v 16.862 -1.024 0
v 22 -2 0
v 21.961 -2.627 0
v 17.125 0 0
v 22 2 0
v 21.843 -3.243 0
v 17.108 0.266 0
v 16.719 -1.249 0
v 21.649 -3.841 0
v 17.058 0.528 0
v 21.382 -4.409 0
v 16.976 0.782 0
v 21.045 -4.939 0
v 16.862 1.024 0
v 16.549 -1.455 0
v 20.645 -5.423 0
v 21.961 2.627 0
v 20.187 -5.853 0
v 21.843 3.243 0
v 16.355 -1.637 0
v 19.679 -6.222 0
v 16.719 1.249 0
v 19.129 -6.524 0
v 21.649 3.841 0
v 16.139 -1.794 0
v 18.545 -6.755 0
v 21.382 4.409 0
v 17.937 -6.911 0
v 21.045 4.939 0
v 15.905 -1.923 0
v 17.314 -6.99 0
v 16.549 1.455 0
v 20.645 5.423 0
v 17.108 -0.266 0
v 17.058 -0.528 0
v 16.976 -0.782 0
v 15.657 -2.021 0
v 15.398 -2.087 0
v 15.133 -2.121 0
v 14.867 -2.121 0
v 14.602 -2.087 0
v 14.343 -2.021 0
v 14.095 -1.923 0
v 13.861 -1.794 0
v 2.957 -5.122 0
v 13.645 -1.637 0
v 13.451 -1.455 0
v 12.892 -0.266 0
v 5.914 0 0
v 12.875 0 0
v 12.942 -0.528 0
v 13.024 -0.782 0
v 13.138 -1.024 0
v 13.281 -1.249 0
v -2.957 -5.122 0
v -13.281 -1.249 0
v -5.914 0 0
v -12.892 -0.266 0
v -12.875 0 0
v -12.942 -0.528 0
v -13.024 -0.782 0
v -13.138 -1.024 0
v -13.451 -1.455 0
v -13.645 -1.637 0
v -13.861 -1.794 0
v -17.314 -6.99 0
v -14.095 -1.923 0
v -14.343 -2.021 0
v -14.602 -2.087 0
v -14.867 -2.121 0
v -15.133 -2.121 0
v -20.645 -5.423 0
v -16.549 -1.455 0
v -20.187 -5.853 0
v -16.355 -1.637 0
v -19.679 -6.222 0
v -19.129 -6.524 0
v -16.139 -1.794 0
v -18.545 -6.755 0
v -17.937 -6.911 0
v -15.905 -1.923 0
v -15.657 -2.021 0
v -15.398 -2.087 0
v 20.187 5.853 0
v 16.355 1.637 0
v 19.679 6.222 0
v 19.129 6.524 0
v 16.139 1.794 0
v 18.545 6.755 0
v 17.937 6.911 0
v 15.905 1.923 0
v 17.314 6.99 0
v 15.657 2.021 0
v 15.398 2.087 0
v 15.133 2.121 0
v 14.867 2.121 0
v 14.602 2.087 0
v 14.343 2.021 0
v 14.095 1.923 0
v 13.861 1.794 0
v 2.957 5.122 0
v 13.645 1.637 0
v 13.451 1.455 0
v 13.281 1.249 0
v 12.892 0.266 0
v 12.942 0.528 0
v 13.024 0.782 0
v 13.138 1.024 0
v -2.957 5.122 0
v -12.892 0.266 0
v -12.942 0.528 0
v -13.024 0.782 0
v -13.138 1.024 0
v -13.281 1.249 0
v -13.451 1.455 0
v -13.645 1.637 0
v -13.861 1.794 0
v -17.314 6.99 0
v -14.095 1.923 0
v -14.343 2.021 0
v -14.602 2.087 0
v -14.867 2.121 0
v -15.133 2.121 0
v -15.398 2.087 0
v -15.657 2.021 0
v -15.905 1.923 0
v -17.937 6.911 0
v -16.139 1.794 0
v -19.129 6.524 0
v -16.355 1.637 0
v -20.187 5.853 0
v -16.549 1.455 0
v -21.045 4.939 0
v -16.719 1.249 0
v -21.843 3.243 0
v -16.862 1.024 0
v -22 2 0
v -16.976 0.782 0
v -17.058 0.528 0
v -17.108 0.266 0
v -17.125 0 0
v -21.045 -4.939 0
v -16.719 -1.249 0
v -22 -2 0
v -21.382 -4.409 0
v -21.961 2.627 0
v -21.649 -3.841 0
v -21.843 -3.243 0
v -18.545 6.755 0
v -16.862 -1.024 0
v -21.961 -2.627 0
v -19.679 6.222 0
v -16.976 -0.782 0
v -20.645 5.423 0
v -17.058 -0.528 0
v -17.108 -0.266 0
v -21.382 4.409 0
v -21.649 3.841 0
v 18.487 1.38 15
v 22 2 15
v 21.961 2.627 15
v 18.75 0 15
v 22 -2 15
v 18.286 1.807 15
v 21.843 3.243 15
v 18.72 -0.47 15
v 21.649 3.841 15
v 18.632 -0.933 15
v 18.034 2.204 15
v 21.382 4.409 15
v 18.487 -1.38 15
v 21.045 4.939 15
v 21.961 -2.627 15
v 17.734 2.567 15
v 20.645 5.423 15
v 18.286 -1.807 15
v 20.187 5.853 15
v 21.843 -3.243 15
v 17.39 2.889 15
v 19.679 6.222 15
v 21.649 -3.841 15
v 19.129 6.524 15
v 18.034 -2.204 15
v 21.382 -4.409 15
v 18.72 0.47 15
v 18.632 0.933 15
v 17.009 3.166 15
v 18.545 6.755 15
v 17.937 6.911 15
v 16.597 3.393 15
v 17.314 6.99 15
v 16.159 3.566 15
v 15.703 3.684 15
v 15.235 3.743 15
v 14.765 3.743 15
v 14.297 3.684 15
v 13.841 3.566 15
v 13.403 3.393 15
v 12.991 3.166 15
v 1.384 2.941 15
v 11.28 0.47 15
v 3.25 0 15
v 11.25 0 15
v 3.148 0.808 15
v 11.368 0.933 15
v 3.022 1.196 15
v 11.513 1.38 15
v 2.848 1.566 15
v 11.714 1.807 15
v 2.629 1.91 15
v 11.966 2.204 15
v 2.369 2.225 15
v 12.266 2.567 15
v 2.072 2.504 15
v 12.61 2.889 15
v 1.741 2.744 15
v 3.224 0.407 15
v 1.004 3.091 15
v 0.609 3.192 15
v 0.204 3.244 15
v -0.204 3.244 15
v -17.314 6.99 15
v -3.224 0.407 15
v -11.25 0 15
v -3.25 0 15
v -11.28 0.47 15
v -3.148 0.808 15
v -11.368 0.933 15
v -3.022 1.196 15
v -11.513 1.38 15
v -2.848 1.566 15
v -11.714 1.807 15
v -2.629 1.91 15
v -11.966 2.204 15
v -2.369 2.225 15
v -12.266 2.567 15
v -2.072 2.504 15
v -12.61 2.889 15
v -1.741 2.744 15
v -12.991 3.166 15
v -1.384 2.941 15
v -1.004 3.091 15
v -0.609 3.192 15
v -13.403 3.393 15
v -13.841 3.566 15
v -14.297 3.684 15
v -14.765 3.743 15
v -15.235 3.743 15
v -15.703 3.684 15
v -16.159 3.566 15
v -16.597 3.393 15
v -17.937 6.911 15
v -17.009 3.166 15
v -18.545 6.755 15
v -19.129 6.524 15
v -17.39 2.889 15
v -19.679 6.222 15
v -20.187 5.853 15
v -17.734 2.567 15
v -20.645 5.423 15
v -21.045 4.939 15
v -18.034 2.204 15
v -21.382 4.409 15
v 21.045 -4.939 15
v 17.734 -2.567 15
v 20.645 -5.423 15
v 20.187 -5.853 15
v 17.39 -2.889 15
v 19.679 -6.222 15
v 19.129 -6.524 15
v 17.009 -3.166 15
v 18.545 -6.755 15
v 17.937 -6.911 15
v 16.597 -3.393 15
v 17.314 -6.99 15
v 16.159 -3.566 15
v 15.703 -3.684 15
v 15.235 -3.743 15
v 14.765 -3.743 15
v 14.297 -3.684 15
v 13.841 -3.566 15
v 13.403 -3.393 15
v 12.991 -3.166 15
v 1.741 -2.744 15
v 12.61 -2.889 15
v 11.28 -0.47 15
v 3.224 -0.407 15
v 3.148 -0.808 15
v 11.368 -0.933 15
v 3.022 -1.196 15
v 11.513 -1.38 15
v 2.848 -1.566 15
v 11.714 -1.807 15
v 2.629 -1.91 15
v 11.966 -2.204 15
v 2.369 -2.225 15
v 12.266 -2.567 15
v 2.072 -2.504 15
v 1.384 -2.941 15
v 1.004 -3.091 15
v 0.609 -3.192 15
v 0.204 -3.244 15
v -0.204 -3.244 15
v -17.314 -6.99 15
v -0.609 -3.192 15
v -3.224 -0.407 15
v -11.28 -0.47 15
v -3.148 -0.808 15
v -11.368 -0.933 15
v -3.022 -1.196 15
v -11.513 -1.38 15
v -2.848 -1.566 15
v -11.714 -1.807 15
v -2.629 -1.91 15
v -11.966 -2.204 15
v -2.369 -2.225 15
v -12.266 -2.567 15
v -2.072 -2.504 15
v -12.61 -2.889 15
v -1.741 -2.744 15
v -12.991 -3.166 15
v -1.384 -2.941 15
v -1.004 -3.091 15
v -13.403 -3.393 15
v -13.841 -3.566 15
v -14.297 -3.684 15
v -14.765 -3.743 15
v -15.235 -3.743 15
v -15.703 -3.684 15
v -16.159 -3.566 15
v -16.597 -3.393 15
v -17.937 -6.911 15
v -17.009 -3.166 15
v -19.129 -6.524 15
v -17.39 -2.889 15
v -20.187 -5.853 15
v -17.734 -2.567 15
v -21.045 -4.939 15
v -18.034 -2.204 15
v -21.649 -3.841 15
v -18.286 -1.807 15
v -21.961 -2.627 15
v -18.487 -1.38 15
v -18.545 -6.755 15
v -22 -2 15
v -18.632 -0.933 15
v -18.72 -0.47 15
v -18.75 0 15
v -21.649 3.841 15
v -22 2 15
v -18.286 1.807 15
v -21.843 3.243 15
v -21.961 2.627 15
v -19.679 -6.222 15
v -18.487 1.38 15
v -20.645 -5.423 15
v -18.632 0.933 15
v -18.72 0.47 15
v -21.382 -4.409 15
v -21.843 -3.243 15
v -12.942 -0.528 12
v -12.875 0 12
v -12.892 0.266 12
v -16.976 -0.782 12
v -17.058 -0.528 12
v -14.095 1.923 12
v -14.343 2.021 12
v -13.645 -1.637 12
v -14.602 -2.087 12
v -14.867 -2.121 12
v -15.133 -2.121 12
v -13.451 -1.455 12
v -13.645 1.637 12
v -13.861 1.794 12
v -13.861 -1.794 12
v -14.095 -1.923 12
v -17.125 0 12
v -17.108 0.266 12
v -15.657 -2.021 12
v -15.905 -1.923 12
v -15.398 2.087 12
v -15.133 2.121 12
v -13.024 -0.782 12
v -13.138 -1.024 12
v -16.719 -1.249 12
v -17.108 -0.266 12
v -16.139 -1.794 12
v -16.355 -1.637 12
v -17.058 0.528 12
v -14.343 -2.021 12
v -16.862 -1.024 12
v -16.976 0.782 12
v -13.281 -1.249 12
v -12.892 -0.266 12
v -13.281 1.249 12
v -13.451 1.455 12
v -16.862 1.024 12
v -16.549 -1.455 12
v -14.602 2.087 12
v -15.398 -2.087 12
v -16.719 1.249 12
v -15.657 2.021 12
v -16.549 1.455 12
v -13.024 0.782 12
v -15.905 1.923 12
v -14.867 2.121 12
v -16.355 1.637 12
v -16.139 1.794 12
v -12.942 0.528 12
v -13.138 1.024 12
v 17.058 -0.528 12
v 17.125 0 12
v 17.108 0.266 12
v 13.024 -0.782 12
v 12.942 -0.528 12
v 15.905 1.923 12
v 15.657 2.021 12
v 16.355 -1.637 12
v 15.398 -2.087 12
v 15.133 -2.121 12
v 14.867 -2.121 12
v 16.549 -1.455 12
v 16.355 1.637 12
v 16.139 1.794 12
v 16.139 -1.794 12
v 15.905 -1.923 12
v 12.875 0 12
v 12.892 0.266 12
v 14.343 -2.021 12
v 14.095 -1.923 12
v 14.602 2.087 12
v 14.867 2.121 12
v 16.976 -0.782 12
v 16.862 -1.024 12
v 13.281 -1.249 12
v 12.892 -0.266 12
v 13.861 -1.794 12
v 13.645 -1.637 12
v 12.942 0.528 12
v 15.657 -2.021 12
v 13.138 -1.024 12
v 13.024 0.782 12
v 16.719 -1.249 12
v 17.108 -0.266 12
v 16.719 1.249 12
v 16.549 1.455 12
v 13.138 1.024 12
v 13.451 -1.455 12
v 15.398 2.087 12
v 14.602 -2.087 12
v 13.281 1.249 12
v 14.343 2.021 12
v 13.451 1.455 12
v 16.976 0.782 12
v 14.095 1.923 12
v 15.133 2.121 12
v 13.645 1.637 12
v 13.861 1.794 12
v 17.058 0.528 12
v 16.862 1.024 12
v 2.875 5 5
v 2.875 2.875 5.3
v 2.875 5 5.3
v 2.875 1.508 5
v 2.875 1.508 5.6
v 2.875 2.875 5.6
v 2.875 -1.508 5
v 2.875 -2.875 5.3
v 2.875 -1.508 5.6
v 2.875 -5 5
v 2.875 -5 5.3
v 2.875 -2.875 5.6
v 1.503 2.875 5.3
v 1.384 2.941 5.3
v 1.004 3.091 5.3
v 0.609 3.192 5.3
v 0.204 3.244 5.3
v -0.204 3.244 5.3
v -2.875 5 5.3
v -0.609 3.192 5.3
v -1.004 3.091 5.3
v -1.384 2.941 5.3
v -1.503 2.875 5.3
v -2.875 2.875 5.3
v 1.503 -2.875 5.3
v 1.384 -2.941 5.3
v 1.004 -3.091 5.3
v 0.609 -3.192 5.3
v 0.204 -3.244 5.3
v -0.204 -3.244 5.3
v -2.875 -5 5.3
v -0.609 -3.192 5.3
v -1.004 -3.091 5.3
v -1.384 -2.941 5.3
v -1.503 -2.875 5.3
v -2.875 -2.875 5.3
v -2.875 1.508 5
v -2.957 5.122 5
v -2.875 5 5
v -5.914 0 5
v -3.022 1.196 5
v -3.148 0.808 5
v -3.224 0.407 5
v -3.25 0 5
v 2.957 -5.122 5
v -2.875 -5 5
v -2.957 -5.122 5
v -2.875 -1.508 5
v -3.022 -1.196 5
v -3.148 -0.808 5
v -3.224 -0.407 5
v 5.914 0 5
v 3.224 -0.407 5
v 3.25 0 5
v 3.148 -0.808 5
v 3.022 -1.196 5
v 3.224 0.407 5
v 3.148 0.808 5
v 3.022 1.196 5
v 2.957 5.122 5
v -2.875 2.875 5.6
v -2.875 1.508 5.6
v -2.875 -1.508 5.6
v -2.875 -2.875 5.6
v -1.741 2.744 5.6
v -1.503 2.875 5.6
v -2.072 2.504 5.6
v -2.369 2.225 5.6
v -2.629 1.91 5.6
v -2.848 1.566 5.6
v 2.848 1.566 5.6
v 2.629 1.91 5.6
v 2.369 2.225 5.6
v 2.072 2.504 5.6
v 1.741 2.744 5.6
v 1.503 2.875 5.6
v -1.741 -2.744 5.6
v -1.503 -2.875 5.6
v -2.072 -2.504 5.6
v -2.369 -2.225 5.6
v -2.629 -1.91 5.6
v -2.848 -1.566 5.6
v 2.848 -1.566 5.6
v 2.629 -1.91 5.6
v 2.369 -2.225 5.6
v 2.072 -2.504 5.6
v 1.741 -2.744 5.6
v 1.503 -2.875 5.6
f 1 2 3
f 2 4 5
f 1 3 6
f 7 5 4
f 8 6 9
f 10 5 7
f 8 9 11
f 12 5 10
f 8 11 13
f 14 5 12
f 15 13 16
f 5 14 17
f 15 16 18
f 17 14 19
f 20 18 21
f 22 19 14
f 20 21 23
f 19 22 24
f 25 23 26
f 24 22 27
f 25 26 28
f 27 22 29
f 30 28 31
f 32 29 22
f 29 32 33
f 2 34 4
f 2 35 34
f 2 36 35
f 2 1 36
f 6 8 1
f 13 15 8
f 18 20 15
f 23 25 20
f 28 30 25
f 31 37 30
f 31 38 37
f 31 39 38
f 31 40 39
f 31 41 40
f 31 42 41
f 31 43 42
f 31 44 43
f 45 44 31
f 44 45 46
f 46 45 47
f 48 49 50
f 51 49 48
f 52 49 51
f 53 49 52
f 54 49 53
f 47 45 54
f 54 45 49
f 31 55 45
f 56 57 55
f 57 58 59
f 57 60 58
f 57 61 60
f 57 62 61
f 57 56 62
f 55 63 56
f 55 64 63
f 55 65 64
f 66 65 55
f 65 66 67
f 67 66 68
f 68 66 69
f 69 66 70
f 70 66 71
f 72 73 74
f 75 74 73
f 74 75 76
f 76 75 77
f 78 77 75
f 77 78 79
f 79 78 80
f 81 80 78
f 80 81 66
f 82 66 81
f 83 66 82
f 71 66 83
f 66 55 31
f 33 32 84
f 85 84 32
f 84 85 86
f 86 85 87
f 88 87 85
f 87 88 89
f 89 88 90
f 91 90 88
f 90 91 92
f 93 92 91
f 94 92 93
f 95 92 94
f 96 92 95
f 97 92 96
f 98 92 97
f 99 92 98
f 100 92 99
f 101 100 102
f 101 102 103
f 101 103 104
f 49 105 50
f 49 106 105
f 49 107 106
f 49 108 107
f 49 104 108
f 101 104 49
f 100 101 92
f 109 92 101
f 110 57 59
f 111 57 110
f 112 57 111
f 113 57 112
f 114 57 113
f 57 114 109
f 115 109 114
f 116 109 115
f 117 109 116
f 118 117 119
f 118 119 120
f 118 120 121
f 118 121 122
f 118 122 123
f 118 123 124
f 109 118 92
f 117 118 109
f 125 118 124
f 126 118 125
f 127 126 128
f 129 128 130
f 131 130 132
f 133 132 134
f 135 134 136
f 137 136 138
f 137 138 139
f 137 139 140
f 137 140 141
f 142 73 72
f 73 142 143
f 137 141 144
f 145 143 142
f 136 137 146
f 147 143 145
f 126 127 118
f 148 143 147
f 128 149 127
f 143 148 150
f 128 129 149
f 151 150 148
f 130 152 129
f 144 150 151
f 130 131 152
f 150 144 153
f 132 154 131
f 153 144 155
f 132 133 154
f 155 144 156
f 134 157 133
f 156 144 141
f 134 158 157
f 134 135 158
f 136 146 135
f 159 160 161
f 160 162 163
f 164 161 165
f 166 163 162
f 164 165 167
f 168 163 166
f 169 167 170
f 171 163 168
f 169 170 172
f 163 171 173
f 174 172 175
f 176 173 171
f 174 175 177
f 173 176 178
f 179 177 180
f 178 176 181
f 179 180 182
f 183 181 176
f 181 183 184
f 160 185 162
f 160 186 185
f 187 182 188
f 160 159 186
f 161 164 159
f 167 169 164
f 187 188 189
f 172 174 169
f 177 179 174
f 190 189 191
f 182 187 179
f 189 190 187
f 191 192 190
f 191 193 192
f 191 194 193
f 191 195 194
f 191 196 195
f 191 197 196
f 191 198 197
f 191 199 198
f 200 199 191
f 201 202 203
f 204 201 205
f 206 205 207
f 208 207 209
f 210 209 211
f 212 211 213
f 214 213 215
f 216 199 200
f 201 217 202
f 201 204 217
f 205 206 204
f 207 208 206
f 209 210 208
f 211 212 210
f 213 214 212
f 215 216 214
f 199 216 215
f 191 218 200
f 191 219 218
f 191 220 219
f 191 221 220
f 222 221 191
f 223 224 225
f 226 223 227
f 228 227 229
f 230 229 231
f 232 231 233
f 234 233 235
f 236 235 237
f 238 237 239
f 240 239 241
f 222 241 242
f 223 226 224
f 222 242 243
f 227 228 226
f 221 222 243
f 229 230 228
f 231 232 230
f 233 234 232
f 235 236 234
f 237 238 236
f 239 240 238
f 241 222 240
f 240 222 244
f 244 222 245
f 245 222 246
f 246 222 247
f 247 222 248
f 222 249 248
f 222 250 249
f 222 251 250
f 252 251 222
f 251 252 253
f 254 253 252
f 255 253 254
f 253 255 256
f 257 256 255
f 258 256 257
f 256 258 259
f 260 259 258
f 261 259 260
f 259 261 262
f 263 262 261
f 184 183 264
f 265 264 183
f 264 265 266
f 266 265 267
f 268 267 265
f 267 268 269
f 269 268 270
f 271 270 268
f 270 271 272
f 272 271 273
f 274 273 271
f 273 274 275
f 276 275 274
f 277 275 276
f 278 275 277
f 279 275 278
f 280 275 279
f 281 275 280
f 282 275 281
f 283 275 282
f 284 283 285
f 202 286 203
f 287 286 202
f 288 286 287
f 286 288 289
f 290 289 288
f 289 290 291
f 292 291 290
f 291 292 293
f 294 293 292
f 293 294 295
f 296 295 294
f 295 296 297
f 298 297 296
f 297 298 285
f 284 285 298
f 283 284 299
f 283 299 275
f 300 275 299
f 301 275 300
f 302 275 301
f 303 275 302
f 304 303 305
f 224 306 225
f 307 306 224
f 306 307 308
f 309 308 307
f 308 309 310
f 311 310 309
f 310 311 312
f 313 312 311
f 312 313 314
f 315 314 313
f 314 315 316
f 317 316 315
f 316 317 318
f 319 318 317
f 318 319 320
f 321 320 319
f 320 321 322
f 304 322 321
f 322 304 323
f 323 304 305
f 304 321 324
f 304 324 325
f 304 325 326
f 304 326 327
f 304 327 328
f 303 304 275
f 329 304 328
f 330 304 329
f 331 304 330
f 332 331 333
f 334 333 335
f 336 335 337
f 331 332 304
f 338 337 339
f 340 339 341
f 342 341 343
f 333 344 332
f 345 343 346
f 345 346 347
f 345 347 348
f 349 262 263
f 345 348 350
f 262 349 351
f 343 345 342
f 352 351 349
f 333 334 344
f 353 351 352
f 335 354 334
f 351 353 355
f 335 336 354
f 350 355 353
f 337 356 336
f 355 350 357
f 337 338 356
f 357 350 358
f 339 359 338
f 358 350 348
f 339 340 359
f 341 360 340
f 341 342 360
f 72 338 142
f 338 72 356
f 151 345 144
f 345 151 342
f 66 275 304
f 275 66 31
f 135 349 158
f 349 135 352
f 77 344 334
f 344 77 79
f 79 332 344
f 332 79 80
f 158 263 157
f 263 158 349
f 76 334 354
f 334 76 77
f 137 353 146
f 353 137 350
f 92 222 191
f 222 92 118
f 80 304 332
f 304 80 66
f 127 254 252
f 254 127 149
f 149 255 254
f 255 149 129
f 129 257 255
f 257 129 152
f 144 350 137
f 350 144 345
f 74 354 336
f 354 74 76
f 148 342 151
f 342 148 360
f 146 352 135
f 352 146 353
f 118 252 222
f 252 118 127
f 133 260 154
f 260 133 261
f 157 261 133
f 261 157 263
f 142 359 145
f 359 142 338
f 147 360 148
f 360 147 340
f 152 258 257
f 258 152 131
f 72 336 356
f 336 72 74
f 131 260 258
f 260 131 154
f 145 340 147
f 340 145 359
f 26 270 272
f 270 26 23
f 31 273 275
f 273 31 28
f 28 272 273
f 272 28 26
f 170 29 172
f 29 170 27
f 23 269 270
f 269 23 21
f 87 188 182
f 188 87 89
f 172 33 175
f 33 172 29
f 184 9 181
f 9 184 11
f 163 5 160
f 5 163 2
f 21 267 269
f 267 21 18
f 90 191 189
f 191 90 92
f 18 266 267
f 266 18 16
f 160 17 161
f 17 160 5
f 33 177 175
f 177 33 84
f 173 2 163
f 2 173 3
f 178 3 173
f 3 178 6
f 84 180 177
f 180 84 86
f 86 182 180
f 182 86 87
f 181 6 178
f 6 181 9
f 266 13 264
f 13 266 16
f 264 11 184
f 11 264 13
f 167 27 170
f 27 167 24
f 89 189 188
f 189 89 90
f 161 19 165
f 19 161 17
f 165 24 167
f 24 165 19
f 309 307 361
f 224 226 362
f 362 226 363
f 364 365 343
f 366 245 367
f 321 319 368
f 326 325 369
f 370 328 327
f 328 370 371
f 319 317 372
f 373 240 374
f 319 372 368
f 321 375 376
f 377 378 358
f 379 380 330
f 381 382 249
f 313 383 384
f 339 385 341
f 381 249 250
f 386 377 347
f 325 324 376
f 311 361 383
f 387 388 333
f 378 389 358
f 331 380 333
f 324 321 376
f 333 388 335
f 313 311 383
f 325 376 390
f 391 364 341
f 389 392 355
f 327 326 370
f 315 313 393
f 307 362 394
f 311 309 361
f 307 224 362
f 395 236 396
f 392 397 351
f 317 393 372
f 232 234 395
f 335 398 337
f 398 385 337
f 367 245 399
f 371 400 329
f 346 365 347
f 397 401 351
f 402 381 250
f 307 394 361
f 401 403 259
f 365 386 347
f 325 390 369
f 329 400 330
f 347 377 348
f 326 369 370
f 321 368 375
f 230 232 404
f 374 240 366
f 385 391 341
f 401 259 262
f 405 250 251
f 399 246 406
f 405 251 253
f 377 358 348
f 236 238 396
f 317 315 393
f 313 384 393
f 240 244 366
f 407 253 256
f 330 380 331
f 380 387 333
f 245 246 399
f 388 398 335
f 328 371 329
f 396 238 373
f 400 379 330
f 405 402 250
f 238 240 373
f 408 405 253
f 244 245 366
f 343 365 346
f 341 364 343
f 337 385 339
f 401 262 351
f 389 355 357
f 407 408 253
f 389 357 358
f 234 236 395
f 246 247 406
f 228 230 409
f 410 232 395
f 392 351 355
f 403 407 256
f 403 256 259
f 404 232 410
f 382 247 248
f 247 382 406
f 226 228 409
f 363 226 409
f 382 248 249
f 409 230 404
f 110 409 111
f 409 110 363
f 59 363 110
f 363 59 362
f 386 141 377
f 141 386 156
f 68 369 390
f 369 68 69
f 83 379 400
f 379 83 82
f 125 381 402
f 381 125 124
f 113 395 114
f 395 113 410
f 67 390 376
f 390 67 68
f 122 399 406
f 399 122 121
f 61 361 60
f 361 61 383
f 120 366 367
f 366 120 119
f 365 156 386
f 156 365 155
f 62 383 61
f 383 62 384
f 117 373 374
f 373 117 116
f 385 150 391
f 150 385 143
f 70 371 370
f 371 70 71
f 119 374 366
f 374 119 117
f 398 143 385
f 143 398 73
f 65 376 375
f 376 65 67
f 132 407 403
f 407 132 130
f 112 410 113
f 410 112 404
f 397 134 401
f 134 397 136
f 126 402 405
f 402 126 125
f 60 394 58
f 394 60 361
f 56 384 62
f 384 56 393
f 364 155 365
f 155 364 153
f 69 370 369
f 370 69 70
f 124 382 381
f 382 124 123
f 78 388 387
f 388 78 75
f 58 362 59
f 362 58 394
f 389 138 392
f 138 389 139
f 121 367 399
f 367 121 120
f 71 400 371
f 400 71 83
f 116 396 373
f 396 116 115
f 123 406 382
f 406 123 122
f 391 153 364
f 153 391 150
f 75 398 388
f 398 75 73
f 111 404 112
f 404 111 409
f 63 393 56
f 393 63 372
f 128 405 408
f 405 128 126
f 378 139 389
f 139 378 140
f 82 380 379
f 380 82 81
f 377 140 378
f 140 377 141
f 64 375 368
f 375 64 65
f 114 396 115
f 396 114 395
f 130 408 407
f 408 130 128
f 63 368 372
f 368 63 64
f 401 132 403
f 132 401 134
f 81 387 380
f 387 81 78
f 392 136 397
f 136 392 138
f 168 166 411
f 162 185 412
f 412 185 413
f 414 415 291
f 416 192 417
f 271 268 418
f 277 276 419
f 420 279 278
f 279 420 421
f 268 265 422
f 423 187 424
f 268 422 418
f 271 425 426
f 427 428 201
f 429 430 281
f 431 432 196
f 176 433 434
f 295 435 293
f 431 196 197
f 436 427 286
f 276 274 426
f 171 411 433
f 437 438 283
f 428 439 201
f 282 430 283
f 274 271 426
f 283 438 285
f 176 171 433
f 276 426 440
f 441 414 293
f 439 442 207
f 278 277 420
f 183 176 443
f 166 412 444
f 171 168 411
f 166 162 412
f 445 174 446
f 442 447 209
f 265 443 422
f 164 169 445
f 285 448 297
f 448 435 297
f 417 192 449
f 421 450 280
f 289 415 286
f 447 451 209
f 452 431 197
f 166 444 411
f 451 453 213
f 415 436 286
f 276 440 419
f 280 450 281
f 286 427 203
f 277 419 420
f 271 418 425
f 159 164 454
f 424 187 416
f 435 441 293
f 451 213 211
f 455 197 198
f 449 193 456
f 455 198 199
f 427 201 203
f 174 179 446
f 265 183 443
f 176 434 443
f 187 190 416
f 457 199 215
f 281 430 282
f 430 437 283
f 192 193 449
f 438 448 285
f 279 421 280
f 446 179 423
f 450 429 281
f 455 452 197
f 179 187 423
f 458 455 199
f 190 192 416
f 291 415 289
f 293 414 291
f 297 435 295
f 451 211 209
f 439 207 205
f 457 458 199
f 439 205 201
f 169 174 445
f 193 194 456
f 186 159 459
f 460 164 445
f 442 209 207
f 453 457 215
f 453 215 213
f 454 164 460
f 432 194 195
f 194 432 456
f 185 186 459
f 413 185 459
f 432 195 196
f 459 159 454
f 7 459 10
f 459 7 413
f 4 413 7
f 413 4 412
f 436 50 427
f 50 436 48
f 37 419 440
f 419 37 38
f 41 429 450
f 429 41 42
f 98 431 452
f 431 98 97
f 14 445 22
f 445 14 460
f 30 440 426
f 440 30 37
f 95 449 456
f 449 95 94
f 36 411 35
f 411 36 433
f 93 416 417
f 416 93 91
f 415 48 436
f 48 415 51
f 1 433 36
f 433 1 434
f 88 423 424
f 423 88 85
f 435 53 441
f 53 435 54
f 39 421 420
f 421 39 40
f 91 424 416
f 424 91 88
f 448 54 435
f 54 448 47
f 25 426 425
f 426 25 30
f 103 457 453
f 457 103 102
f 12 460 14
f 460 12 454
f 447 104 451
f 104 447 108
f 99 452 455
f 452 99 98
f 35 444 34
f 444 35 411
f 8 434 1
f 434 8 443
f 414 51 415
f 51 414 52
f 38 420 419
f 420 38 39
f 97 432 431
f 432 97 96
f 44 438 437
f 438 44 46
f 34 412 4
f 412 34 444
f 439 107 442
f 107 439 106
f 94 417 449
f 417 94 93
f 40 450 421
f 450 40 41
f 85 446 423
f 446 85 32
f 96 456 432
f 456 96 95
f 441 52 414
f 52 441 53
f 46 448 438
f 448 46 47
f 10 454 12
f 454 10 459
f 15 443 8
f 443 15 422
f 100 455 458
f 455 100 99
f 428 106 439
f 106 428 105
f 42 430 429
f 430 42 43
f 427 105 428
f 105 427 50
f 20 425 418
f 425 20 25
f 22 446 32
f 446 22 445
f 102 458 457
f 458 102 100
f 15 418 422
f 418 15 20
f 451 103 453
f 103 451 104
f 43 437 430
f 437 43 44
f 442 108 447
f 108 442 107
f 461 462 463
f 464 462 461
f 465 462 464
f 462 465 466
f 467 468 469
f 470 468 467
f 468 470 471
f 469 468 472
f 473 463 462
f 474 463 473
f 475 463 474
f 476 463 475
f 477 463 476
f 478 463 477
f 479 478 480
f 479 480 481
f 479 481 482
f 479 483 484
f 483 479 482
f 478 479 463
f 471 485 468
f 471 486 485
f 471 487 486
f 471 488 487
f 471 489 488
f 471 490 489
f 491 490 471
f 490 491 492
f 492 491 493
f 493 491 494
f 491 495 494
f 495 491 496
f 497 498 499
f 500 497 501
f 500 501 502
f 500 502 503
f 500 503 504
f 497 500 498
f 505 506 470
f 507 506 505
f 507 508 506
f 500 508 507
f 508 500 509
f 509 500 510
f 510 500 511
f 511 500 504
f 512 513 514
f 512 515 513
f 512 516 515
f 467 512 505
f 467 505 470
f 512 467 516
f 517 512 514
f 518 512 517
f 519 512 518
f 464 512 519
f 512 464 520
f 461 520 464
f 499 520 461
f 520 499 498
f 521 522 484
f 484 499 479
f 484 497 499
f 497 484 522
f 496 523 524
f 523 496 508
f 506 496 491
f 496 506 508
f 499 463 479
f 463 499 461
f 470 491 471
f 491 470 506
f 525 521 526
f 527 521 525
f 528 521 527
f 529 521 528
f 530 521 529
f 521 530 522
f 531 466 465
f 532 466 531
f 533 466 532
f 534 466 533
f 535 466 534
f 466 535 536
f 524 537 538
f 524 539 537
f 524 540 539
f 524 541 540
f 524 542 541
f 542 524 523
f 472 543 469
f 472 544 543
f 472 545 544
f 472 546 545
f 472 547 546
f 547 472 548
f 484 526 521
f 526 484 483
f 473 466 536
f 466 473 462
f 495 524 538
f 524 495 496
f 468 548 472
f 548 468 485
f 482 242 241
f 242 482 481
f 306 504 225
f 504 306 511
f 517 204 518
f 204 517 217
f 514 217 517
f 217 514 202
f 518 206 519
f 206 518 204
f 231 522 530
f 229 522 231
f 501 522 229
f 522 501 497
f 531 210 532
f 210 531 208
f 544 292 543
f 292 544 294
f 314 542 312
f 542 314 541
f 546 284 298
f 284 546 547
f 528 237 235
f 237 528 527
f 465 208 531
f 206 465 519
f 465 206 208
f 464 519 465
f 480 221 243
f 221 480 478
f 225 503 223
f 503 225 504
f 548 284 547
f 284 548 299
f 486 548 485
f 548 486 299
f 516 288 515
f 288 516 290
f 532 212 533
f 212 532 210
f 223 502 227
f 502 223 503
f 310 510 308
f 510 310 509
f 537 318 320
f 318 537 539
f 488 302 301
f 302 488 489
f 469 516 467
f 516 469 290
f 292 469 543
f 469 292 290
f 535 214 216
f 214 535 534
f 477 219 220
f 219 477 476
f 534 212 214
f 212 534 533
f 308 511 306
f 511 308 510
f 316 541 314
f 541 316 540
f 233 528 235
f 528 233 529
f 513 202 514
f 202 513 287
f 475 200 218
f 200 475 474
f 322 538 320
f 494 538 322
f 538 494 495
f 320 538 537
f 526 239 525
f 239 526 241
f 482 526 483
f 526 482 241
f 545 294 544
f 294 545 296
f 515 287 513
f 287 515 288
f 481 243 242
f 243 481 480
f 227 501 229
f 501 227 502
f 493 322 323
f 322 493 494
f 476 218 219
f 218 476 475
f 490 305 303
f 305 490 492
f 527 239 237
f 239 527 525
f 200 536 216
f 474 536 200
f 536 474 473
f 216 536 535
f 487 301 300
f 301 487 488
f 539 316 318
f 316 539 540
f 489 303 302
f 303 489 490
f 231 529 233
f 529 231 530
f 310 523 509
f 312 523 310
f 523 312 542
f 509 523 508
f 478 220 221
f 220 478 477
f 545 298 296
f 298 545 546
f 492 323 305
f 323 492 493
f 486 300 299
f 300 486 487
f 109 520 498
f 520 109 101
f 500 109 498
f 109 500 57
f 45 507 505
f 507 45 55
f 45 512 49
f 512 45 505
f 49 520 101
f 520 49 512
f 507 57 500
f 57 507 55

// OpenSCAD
$fn = 50;


difference() {
	union() {
		cylinder(h = 15, r = 7.0000000000);
		translate(v = [-7.5000000000, 0.0000000000, 0]) {
			hull() {
				translate(v = [-9.5000000000, 2.0000000000, 0]) {
					cylinder(h = 15, r = 5);
				}
				translate(v = [9.5000000000, 2.0000000000, 0]) {
					cylinder(h = 15, r = 5);
				}
				translate(v = [-9.5000000000, -2.0000000000, 0]) {
					cylinder(h = 15, r = 5);
				}
				translate(v = [9.5000000000, -2.0000000000, 0]) {
					cylinder(h = 15, r = 5);
				}
			}
		}
		translate(v = [-7.5000000000, 0.0000000000, 0]) {
			hull() {
				translate(v = [-9.5000000000, 2.0000000000, 0]) {
					cylinder(h = 15, r = 5);
				}
				translate(v = [9.5000000000, 2.0000000000, 0]) {
					cylinder(h = 15, r = 5);
				}
				translate(v = [-9.5000000000, -2.0000000000, 0]) {
					cylinder(h = 15, r = 5);
				}
				translate(v = [9.5000000000, -2.0000000000, 0]) {
					cylinder(h = 15, r = 5);
				}
			}
		}
		translate(v = [7.5000000000, 0.0000000000, 0]) {
			hull() {
				translate(v = [-9.5000000000, 2.0000000000, 0]) {
					cylinder(h = 15, r = 5);
				}
				translate(v = [9.5000000000, 2.0000000000, 0]) {
					cylinder(h = 15, r = 5);
				}
				translate(v = [-9.5000000000, -2.0000000000, 0]) {
					cylinder(h = 15, r = 5);
				}
				translate(v = [9.5000000000, -2.0000000000, 0]) {
					cylinder(h = 15, r = 5);
				}
			}
		}
		translate(v = [7.5000000000, 0.0000000000, 0]) {
			hull() {
				translate(v = [-9.5000000000, 2.0000000000, 0]) {
					cylinder(h = 15, r = 5);
				}
				translate(v = [9.5000000000, 2.0000000000, 0]) {
					cylinder(h = 15, r = 5);
				}
				translate(v = [-9.5000000000, -2.0000000000, 0]) {
					cylinder(h = 15, r = 5);
				}
				translate(v = [9.5000000000, -2.0000000000, 0]) {
					cylinder(h = 15, r = 5);
				}
			}
		}
	}
	union() {
		translate(v = [-15.0000000000, 0.0000000000, 15]) {
			rotate(a = [0, 0, 0]) {
				difference() {
					union() {
						#translate(v = [0, 0, -15.0000000000]) {
							cylinder(h = 15, r = 2.0000000000);
						}
						#translate(v = [0, 0, -3]) {
							cylinder(h = 3, r1 = 2.1250000000, r2 = 3.7500000000);
						}
						#translate(v = [0, 0, -15.0000000000]) {
							cylinder(h = 15, r = 2.1250000000);
						}
						#translate(v = [0, 0, -15.0000000000]) {
							cylinder(h = 15, r = 2.0000000000);
						}
					}
					union();
				}
			}
		}
		translate(v = [-15.0000000000, 0.0000000000, 15]) {
			rotate(a = [0, 0, 0]) {
				difference() {
					union() {
						#translate(v = [0, 0, -15.0000000000]) {
							cylinder(h = 15, r = 2.0000000000);
						}
						#translate(v = [0, 0, -3]) {
							cylinder(h = 3, r1 = 2.1250000000, r2 = 3.7500000000);
						}
						#translate(v = [0, 0, -15.0000000000]) {
							cylinder(h = 15, r = 2.1250000000);
						}
						#translate(v = [0, 0, -15.0000000000]) {
							cylinder(h = 15, r = 2.0000000000);
						}
					}
					union();
				}
			}
		}
		translate(v = [15.0000000000, 0.0000000000, 15]) {
			rotate(a = [0, 0, 0]) {
				difference() {
					union() {
						#translate(v = [0, 0, -15.0000000000]) {
							cylinder(h = 15, r = 2.0000000000);
						}
						#translate(v = [0, 0, -3]) {
							cylinder(h = 3, r1 = 2.1250000000, r2 = 3.7500000000);
						}
						#translate(v = [0, 0, -15.0000000000]) {
							cylinder(h = 15, r = 2.1250000000);
						}
						#translate(v = [0, 0, -15.0000000000]) {
							cylinder(h = 15, r = 2.0000000000);
						}
					}
					union();
				}
			}
		}
		translate(v = [15.0000000000, 0.0000000000, 15]) {
			rotate(a = [0, 0, 0]) {
				difference() {
					union() {
						#translate(v = [0, 0, -15.0000000000]) {
							cylinder(h = 15, r = 2.0000000000);
						}
						#translate(v = [0, 0, -3]) {
							cylinder(h = 3, r1 = 2.1250000000, r2 = 3.7500000000);
						}
						#translate(v = [0, 0, -15.0000000000]) {
							cylinder(h = 15, r = 2.1250000000);
						}
						#translate(v = [0, 0, -15.0000000000]) {
							cylinder(h = 15, r = 2.0000000000);
						}
					}
					union();
				}
			}
		}
		translate(v = [0.0000000000, 0.0000000000, 0]) {
			rotate(a = [0, 0, 0]) {
				difference() {
					union() {
						#translate(v = [-2.8750000000, -5.0000000000, -0.3000000000]) {
							cube(size = [5.7500000000, 10, 0.3000000000]);
						}
						#translate(v = [-2.8750000000, -2.8750000000, -0.6000000000]) {
							cube(size = [5.7500000000, 5.7500000000, 0.3000000000]);
						}
						#translate(v = [-2.8750000000, -5.0000000000, 5]) {
							cube(size = [5.7500000000, 10, 0.3000000000]);
						}
						#translate(v = [-2.8750000000, -2.8750000000, 5.3000000000]) {
							cube(size = [5.7500000000, 5.7500000000, 0.3000000000]);
						}
						#translate(v = [0, 0, -100.0000000000]) {
							cylinder(h = 200, r = 3.2500000000);
						}
						#linear_extrude(height = 5) {
							polygon(points = [[5.9142500000, 0.0000000000], [2.9571250000, 5.1218907443], [-2.9571250000, 5.1218907443], [-5.9142500000, 0.0000000000], [-2.9571250000, -5.1218907443], [2.9571250000, -5.1218907443]]);
						}
						#translate(v = [-2.8750000000, -5.0000000000, -0.3000000000]) {
							cube(size = [5.7500000000, 10, 0.3000000000]);
						}
						#translate(v = [-2.8750000000, -2.8750000000, -0.6000000000]) {
							cube(size = [5.7500000000, 5.7500000000, 0.3000000000]);
						}
						#translate(v = [-2.8750000000, -5.0000000000, 5]) {
							cube(size = [5.7500000000, 10, 0.3000000000]);
						}
						#translate(v = [-2.8750000000, -2.8750000000, 5.3000000000]) {
							cube(size = [5.7500000000, 5.7500000000, 0.3000000000]);
						}
						#translate(v = [0, 0, -100.0000000000]) {
							cylinder(h = 200, r = 3.2500000000);
						}
						#translate(v = [-2.8750000000, -5.0000000000, -0.3000000000]) {
							cube(size = [5.7500000000, 10, 0.3000000000]);
						}
						#translate(v = [-2.8750000000, -2.8750000000, -0.6000000000]) {
							cube(size = [5.7500000000, 5.7500000000, 0.3000000000]);
						}
						#translate(v = [-2.8750000000, -5.0000000000, 5]) {
							cube(size = [5.7500000000, 10, 0.3000000000]);
						}
						#translate(v = [-2.8750000000, -2.8750000000, 5.3000000000]) {
							cube(size = [5.7500000000, 5.7500000000, 0.3000000000]);
						}
						#translate(v = [0, 0, -100.0000000000]) {
							cylinder(h = 200, r = 3.2500000000);
						}
					}
					union();
				}
			}
		}
		translate(v = [0, 0, -100]) {
			cylinder(h = 200, r = 3.2500000000);
		}
		translate(v = [0, 0, -100]) {
			cylinder(h = 200, r = 1.8000000000);
		}
	}
}
